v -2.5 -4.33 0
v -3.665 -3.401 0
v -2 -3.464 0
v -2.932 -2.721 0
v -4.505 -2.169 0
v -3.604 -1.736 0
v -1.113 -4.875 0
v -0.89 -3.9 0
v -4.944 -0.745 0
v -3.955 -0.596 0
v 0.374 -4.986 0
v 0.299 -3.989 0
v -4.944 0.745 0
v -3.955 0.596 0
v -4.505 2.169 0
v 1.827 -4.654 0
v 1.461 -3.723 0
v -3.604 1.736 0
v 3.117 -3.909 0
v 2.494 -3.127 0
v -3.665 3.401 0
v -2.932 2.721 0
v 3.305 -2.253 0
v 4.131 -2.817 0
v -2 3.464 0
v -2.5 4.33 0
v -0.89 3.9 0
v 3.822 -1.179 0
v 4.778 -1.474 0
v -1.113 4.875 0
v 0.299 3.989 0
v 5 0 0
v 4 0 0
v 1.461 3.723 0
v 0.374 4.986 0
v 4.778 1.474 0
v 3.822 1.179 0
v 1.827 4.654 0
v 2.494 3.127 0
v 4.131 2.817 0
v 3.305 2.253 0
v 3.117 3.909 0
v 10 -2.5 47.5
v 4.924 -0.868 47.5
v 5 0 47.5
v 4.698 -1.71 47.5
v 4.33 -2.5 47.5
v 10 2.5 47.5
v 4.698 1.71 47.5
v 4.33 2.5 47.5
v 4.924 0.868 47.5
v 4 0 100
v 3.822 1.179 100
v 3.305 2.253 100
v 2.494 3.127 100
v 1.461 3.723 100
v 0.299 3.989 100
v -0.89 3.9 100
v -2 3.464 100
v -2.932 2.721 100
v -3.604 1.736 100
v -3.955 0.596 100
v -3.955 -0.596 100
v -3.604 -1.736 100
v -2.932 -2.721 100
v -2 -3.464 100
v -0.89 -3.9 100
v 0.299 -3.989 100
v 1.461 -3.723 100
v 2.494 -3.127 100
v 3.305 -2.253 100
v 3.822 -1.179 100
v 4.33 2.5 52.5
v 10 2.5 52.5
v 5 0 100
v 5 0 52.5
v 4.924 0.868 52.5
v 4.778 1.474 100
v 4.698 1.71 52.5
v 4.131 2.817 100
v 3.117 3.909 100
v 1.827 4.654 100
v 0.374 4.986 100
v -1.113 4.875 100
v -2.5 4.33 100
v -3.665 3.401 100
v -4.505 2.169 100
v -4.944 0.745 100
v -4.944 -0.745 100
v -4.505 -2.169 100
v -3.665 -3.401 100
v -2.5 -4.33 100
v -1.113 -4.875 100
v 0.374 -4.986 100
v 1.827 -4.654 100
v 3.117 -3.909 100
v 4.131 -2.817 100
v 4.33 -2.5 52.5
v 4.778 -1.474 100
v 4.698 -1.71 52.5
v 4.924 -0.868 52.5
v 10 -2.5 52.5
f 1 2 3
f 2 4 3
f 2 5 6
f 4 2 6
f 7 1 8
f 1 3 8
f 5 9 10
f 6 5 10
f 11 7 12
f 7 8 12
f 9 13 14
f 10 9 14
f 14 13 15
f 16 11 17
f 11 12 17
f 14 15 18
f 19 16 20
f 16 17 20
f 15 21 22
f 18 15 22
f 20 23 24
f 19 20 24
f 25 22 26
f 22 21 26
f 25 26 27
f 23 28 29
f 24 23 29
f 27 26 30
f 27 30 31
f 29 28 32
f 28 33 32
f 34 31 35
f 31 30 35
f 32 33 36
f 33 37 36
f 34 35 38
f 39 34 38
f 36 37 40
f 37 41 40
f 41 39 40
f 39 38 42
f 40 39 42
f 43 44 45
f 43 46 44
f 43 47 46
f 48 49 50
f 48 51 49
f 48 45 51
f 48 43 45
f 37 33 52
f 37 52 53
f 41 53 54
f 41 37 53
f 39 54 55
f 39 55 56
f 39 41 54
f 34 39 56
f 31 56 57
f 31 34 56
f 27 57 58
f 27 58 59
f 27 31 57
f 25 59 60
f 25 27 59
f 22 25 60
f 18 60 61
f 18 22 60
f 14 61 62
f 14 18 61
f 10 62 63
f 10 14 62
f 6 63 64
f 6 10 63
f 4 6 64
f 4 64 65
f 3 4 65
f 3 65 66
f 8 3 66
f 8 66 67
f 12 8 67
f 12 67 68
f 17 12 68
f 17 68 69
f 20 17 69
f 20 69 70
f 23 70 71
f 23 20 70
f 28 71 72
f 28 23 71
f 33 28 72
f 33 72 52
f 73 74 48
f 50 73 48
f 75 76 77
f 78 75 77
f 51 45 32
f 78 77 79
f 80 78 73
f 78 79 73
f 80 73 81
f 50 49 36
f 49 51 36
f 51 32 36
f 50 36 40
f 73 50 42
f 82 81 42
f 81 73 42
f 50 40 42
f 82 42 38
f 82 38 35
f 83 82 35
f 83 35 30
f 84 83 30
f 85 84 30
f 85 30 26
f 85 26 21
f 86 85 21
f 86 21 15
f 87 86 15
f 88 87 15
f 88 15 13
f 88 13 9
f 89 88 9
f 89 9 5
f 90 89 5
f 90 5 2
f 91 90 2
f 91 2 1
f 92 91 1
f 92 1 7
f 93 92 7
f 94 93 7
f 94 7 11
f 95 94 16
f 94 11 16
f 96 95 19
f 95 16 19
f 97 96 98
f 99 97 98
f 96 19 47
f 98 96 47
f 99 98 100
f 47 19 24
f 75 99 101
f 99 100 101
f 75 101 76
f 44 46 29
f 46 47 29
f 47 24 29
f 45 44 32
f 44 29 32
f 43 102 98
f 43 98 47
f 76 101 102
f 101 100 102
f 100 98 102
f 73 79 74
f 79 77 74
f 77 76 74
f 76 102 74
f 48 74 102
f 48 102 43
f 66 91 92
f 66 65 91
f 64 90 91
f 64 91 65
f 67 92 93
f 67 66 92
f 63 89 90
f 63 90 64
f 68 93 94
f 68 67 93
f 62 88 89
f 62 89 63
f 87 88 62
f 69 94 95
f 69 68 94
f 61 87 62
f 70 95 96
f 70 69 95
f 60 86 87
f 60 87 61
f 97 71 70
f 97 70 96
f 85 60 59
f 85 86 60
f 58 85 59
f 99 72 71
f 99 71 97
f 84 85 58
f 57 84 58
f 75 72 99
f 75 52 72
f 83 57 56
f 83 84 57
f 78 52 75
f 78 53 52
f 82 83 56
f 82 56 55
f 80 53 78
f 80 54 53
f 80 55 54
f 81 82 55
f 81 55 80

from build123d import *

# Parameters (mm, degrees)
SKIZZE1_R                       = 5
SKIZZE1_R_2                     = 4
AUFSATZ_LINEAR_AUSTRAGEN1_DEPTH = 100
BOSS_EXTRUDE2_REACH             = 103.242
BOSS_EXTRUDE2_END_RADIUS        = 5
SKETCH1_W                       = 5
SKETCH1_H                       = 5


with BuildPart() as part:
    # Skizze1 → Aufsatz-Linear austragen1 (new body)
    with BuildSketch(Plane.XY):
        Circle(SKIZZE1_R)
        Circle(SKIZZE1_R_2, mode=Mode.SUBTRACT)
    extrude(amount=AUFSATZ_LINEAR_AUSTRAGEN1_DEPTH)

    # Boss-Extrude2: up to this cylinder (the profile starts outside it)
    boss_extrude2_end = Plane(origin=(0, 0, 50), z_dir=(0, 0, -1)) * Cylinder(BOSS_EXTRUDE2_END_RADIUS, 217.484, mode=Mode.PRIVATE)
    # Sketch1 → Boss-Extrude2 (add, up to the surface)
    with BuildSketch(Plane(origin=(10, 0, 0), x_dir=(0, 0, -1), z_dir=(1, 0, 0)), mode=Mode.PRIVATE) as boss_extrude2_sk1:
        with Locations((-50, 0)):
            Rectangle(SKETCH1_W, SKETCH1_H)
    boss_extrude2_tool1 = extrude(boss_extrude2_sk1.sketch, amount=-BOSS_EXTRUDE2_REACH, mode=Mode.PRIVATE) - boss_extrude2_end
    add(boss_extrude2_tool1.solids().sort_by_distance((10, 0, 50))[0])


solid = part.part
